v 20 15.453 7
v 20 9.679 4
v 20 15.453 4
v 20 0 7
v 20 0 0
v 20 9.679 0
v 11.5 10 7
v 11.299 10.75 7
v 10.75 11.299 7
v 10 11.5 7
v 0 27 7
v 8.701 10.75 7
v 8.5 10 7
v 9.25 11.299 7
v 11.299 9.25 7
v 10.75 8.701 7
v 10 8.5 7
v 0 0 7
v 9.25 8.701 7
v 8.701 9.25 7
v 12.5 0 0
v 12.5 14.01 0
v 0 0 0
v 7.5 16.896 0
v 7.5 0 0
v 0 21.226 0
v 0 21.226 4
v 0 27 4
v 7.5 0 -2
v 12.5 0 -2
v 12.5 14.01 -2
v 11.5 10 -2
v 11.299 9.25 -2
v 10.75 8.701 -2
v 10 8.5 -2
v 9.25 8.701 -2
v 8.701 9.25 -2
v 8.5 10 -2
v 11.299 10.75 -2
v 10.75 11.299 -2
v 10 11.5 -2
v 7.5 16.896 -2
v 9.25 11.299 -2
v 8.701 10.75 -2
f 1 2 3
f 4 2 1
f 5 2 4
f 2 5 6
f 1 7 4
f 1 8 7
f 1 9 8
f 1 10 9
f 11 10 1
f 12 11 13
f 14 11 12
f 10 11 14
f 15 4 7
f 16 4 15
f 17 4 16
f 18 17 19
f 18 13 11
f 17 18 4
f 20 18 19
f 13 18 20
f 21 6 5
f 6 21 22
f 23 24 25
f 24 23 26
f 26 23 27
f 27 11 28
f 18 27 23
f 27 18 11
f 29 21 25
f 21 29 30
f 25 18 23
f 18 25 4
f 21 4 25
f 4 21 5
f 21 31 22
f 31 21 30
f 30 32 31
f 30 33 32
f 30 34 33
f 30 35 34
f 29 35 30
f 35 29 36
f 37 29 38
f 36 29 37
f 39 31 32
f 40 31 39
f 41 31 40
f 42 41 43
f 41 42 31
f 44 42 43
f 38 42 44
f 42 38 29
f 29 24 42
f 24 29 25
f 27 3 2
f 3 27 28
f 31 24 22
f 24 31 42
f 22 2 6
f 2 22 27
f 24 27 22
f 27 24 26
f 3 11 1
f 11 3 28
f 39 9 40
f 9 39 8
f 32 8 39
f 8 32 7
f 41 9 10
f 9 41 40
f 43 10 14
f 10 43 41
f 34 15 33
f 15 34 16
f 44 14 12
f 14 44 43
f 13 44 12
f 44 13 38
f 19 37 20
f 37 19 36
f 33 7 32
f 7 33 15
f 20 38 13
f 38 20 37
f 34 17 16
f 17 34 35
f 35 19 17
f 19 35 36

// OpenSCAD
difference()
{
	union()
	{
		cube([20,30,7]);
		translate([10-2.5,0,-2])cube([5,30,2]);
	}
	translate([10,10,0])
	{
		translate([0,0,-3])cylinder(r=3/2,h=20,$fn=12);
		//translate([0,0,3])cylinder(r=6.2/2,h=4,$fn=12);
	}
	translate([-10,27,0])
	rotate([0,0,-30])
	translate([0,0,-3])
	{	
		cube([100,100,7]);
		translate([0,5,0])cube([100,100,10]);
	}
}
